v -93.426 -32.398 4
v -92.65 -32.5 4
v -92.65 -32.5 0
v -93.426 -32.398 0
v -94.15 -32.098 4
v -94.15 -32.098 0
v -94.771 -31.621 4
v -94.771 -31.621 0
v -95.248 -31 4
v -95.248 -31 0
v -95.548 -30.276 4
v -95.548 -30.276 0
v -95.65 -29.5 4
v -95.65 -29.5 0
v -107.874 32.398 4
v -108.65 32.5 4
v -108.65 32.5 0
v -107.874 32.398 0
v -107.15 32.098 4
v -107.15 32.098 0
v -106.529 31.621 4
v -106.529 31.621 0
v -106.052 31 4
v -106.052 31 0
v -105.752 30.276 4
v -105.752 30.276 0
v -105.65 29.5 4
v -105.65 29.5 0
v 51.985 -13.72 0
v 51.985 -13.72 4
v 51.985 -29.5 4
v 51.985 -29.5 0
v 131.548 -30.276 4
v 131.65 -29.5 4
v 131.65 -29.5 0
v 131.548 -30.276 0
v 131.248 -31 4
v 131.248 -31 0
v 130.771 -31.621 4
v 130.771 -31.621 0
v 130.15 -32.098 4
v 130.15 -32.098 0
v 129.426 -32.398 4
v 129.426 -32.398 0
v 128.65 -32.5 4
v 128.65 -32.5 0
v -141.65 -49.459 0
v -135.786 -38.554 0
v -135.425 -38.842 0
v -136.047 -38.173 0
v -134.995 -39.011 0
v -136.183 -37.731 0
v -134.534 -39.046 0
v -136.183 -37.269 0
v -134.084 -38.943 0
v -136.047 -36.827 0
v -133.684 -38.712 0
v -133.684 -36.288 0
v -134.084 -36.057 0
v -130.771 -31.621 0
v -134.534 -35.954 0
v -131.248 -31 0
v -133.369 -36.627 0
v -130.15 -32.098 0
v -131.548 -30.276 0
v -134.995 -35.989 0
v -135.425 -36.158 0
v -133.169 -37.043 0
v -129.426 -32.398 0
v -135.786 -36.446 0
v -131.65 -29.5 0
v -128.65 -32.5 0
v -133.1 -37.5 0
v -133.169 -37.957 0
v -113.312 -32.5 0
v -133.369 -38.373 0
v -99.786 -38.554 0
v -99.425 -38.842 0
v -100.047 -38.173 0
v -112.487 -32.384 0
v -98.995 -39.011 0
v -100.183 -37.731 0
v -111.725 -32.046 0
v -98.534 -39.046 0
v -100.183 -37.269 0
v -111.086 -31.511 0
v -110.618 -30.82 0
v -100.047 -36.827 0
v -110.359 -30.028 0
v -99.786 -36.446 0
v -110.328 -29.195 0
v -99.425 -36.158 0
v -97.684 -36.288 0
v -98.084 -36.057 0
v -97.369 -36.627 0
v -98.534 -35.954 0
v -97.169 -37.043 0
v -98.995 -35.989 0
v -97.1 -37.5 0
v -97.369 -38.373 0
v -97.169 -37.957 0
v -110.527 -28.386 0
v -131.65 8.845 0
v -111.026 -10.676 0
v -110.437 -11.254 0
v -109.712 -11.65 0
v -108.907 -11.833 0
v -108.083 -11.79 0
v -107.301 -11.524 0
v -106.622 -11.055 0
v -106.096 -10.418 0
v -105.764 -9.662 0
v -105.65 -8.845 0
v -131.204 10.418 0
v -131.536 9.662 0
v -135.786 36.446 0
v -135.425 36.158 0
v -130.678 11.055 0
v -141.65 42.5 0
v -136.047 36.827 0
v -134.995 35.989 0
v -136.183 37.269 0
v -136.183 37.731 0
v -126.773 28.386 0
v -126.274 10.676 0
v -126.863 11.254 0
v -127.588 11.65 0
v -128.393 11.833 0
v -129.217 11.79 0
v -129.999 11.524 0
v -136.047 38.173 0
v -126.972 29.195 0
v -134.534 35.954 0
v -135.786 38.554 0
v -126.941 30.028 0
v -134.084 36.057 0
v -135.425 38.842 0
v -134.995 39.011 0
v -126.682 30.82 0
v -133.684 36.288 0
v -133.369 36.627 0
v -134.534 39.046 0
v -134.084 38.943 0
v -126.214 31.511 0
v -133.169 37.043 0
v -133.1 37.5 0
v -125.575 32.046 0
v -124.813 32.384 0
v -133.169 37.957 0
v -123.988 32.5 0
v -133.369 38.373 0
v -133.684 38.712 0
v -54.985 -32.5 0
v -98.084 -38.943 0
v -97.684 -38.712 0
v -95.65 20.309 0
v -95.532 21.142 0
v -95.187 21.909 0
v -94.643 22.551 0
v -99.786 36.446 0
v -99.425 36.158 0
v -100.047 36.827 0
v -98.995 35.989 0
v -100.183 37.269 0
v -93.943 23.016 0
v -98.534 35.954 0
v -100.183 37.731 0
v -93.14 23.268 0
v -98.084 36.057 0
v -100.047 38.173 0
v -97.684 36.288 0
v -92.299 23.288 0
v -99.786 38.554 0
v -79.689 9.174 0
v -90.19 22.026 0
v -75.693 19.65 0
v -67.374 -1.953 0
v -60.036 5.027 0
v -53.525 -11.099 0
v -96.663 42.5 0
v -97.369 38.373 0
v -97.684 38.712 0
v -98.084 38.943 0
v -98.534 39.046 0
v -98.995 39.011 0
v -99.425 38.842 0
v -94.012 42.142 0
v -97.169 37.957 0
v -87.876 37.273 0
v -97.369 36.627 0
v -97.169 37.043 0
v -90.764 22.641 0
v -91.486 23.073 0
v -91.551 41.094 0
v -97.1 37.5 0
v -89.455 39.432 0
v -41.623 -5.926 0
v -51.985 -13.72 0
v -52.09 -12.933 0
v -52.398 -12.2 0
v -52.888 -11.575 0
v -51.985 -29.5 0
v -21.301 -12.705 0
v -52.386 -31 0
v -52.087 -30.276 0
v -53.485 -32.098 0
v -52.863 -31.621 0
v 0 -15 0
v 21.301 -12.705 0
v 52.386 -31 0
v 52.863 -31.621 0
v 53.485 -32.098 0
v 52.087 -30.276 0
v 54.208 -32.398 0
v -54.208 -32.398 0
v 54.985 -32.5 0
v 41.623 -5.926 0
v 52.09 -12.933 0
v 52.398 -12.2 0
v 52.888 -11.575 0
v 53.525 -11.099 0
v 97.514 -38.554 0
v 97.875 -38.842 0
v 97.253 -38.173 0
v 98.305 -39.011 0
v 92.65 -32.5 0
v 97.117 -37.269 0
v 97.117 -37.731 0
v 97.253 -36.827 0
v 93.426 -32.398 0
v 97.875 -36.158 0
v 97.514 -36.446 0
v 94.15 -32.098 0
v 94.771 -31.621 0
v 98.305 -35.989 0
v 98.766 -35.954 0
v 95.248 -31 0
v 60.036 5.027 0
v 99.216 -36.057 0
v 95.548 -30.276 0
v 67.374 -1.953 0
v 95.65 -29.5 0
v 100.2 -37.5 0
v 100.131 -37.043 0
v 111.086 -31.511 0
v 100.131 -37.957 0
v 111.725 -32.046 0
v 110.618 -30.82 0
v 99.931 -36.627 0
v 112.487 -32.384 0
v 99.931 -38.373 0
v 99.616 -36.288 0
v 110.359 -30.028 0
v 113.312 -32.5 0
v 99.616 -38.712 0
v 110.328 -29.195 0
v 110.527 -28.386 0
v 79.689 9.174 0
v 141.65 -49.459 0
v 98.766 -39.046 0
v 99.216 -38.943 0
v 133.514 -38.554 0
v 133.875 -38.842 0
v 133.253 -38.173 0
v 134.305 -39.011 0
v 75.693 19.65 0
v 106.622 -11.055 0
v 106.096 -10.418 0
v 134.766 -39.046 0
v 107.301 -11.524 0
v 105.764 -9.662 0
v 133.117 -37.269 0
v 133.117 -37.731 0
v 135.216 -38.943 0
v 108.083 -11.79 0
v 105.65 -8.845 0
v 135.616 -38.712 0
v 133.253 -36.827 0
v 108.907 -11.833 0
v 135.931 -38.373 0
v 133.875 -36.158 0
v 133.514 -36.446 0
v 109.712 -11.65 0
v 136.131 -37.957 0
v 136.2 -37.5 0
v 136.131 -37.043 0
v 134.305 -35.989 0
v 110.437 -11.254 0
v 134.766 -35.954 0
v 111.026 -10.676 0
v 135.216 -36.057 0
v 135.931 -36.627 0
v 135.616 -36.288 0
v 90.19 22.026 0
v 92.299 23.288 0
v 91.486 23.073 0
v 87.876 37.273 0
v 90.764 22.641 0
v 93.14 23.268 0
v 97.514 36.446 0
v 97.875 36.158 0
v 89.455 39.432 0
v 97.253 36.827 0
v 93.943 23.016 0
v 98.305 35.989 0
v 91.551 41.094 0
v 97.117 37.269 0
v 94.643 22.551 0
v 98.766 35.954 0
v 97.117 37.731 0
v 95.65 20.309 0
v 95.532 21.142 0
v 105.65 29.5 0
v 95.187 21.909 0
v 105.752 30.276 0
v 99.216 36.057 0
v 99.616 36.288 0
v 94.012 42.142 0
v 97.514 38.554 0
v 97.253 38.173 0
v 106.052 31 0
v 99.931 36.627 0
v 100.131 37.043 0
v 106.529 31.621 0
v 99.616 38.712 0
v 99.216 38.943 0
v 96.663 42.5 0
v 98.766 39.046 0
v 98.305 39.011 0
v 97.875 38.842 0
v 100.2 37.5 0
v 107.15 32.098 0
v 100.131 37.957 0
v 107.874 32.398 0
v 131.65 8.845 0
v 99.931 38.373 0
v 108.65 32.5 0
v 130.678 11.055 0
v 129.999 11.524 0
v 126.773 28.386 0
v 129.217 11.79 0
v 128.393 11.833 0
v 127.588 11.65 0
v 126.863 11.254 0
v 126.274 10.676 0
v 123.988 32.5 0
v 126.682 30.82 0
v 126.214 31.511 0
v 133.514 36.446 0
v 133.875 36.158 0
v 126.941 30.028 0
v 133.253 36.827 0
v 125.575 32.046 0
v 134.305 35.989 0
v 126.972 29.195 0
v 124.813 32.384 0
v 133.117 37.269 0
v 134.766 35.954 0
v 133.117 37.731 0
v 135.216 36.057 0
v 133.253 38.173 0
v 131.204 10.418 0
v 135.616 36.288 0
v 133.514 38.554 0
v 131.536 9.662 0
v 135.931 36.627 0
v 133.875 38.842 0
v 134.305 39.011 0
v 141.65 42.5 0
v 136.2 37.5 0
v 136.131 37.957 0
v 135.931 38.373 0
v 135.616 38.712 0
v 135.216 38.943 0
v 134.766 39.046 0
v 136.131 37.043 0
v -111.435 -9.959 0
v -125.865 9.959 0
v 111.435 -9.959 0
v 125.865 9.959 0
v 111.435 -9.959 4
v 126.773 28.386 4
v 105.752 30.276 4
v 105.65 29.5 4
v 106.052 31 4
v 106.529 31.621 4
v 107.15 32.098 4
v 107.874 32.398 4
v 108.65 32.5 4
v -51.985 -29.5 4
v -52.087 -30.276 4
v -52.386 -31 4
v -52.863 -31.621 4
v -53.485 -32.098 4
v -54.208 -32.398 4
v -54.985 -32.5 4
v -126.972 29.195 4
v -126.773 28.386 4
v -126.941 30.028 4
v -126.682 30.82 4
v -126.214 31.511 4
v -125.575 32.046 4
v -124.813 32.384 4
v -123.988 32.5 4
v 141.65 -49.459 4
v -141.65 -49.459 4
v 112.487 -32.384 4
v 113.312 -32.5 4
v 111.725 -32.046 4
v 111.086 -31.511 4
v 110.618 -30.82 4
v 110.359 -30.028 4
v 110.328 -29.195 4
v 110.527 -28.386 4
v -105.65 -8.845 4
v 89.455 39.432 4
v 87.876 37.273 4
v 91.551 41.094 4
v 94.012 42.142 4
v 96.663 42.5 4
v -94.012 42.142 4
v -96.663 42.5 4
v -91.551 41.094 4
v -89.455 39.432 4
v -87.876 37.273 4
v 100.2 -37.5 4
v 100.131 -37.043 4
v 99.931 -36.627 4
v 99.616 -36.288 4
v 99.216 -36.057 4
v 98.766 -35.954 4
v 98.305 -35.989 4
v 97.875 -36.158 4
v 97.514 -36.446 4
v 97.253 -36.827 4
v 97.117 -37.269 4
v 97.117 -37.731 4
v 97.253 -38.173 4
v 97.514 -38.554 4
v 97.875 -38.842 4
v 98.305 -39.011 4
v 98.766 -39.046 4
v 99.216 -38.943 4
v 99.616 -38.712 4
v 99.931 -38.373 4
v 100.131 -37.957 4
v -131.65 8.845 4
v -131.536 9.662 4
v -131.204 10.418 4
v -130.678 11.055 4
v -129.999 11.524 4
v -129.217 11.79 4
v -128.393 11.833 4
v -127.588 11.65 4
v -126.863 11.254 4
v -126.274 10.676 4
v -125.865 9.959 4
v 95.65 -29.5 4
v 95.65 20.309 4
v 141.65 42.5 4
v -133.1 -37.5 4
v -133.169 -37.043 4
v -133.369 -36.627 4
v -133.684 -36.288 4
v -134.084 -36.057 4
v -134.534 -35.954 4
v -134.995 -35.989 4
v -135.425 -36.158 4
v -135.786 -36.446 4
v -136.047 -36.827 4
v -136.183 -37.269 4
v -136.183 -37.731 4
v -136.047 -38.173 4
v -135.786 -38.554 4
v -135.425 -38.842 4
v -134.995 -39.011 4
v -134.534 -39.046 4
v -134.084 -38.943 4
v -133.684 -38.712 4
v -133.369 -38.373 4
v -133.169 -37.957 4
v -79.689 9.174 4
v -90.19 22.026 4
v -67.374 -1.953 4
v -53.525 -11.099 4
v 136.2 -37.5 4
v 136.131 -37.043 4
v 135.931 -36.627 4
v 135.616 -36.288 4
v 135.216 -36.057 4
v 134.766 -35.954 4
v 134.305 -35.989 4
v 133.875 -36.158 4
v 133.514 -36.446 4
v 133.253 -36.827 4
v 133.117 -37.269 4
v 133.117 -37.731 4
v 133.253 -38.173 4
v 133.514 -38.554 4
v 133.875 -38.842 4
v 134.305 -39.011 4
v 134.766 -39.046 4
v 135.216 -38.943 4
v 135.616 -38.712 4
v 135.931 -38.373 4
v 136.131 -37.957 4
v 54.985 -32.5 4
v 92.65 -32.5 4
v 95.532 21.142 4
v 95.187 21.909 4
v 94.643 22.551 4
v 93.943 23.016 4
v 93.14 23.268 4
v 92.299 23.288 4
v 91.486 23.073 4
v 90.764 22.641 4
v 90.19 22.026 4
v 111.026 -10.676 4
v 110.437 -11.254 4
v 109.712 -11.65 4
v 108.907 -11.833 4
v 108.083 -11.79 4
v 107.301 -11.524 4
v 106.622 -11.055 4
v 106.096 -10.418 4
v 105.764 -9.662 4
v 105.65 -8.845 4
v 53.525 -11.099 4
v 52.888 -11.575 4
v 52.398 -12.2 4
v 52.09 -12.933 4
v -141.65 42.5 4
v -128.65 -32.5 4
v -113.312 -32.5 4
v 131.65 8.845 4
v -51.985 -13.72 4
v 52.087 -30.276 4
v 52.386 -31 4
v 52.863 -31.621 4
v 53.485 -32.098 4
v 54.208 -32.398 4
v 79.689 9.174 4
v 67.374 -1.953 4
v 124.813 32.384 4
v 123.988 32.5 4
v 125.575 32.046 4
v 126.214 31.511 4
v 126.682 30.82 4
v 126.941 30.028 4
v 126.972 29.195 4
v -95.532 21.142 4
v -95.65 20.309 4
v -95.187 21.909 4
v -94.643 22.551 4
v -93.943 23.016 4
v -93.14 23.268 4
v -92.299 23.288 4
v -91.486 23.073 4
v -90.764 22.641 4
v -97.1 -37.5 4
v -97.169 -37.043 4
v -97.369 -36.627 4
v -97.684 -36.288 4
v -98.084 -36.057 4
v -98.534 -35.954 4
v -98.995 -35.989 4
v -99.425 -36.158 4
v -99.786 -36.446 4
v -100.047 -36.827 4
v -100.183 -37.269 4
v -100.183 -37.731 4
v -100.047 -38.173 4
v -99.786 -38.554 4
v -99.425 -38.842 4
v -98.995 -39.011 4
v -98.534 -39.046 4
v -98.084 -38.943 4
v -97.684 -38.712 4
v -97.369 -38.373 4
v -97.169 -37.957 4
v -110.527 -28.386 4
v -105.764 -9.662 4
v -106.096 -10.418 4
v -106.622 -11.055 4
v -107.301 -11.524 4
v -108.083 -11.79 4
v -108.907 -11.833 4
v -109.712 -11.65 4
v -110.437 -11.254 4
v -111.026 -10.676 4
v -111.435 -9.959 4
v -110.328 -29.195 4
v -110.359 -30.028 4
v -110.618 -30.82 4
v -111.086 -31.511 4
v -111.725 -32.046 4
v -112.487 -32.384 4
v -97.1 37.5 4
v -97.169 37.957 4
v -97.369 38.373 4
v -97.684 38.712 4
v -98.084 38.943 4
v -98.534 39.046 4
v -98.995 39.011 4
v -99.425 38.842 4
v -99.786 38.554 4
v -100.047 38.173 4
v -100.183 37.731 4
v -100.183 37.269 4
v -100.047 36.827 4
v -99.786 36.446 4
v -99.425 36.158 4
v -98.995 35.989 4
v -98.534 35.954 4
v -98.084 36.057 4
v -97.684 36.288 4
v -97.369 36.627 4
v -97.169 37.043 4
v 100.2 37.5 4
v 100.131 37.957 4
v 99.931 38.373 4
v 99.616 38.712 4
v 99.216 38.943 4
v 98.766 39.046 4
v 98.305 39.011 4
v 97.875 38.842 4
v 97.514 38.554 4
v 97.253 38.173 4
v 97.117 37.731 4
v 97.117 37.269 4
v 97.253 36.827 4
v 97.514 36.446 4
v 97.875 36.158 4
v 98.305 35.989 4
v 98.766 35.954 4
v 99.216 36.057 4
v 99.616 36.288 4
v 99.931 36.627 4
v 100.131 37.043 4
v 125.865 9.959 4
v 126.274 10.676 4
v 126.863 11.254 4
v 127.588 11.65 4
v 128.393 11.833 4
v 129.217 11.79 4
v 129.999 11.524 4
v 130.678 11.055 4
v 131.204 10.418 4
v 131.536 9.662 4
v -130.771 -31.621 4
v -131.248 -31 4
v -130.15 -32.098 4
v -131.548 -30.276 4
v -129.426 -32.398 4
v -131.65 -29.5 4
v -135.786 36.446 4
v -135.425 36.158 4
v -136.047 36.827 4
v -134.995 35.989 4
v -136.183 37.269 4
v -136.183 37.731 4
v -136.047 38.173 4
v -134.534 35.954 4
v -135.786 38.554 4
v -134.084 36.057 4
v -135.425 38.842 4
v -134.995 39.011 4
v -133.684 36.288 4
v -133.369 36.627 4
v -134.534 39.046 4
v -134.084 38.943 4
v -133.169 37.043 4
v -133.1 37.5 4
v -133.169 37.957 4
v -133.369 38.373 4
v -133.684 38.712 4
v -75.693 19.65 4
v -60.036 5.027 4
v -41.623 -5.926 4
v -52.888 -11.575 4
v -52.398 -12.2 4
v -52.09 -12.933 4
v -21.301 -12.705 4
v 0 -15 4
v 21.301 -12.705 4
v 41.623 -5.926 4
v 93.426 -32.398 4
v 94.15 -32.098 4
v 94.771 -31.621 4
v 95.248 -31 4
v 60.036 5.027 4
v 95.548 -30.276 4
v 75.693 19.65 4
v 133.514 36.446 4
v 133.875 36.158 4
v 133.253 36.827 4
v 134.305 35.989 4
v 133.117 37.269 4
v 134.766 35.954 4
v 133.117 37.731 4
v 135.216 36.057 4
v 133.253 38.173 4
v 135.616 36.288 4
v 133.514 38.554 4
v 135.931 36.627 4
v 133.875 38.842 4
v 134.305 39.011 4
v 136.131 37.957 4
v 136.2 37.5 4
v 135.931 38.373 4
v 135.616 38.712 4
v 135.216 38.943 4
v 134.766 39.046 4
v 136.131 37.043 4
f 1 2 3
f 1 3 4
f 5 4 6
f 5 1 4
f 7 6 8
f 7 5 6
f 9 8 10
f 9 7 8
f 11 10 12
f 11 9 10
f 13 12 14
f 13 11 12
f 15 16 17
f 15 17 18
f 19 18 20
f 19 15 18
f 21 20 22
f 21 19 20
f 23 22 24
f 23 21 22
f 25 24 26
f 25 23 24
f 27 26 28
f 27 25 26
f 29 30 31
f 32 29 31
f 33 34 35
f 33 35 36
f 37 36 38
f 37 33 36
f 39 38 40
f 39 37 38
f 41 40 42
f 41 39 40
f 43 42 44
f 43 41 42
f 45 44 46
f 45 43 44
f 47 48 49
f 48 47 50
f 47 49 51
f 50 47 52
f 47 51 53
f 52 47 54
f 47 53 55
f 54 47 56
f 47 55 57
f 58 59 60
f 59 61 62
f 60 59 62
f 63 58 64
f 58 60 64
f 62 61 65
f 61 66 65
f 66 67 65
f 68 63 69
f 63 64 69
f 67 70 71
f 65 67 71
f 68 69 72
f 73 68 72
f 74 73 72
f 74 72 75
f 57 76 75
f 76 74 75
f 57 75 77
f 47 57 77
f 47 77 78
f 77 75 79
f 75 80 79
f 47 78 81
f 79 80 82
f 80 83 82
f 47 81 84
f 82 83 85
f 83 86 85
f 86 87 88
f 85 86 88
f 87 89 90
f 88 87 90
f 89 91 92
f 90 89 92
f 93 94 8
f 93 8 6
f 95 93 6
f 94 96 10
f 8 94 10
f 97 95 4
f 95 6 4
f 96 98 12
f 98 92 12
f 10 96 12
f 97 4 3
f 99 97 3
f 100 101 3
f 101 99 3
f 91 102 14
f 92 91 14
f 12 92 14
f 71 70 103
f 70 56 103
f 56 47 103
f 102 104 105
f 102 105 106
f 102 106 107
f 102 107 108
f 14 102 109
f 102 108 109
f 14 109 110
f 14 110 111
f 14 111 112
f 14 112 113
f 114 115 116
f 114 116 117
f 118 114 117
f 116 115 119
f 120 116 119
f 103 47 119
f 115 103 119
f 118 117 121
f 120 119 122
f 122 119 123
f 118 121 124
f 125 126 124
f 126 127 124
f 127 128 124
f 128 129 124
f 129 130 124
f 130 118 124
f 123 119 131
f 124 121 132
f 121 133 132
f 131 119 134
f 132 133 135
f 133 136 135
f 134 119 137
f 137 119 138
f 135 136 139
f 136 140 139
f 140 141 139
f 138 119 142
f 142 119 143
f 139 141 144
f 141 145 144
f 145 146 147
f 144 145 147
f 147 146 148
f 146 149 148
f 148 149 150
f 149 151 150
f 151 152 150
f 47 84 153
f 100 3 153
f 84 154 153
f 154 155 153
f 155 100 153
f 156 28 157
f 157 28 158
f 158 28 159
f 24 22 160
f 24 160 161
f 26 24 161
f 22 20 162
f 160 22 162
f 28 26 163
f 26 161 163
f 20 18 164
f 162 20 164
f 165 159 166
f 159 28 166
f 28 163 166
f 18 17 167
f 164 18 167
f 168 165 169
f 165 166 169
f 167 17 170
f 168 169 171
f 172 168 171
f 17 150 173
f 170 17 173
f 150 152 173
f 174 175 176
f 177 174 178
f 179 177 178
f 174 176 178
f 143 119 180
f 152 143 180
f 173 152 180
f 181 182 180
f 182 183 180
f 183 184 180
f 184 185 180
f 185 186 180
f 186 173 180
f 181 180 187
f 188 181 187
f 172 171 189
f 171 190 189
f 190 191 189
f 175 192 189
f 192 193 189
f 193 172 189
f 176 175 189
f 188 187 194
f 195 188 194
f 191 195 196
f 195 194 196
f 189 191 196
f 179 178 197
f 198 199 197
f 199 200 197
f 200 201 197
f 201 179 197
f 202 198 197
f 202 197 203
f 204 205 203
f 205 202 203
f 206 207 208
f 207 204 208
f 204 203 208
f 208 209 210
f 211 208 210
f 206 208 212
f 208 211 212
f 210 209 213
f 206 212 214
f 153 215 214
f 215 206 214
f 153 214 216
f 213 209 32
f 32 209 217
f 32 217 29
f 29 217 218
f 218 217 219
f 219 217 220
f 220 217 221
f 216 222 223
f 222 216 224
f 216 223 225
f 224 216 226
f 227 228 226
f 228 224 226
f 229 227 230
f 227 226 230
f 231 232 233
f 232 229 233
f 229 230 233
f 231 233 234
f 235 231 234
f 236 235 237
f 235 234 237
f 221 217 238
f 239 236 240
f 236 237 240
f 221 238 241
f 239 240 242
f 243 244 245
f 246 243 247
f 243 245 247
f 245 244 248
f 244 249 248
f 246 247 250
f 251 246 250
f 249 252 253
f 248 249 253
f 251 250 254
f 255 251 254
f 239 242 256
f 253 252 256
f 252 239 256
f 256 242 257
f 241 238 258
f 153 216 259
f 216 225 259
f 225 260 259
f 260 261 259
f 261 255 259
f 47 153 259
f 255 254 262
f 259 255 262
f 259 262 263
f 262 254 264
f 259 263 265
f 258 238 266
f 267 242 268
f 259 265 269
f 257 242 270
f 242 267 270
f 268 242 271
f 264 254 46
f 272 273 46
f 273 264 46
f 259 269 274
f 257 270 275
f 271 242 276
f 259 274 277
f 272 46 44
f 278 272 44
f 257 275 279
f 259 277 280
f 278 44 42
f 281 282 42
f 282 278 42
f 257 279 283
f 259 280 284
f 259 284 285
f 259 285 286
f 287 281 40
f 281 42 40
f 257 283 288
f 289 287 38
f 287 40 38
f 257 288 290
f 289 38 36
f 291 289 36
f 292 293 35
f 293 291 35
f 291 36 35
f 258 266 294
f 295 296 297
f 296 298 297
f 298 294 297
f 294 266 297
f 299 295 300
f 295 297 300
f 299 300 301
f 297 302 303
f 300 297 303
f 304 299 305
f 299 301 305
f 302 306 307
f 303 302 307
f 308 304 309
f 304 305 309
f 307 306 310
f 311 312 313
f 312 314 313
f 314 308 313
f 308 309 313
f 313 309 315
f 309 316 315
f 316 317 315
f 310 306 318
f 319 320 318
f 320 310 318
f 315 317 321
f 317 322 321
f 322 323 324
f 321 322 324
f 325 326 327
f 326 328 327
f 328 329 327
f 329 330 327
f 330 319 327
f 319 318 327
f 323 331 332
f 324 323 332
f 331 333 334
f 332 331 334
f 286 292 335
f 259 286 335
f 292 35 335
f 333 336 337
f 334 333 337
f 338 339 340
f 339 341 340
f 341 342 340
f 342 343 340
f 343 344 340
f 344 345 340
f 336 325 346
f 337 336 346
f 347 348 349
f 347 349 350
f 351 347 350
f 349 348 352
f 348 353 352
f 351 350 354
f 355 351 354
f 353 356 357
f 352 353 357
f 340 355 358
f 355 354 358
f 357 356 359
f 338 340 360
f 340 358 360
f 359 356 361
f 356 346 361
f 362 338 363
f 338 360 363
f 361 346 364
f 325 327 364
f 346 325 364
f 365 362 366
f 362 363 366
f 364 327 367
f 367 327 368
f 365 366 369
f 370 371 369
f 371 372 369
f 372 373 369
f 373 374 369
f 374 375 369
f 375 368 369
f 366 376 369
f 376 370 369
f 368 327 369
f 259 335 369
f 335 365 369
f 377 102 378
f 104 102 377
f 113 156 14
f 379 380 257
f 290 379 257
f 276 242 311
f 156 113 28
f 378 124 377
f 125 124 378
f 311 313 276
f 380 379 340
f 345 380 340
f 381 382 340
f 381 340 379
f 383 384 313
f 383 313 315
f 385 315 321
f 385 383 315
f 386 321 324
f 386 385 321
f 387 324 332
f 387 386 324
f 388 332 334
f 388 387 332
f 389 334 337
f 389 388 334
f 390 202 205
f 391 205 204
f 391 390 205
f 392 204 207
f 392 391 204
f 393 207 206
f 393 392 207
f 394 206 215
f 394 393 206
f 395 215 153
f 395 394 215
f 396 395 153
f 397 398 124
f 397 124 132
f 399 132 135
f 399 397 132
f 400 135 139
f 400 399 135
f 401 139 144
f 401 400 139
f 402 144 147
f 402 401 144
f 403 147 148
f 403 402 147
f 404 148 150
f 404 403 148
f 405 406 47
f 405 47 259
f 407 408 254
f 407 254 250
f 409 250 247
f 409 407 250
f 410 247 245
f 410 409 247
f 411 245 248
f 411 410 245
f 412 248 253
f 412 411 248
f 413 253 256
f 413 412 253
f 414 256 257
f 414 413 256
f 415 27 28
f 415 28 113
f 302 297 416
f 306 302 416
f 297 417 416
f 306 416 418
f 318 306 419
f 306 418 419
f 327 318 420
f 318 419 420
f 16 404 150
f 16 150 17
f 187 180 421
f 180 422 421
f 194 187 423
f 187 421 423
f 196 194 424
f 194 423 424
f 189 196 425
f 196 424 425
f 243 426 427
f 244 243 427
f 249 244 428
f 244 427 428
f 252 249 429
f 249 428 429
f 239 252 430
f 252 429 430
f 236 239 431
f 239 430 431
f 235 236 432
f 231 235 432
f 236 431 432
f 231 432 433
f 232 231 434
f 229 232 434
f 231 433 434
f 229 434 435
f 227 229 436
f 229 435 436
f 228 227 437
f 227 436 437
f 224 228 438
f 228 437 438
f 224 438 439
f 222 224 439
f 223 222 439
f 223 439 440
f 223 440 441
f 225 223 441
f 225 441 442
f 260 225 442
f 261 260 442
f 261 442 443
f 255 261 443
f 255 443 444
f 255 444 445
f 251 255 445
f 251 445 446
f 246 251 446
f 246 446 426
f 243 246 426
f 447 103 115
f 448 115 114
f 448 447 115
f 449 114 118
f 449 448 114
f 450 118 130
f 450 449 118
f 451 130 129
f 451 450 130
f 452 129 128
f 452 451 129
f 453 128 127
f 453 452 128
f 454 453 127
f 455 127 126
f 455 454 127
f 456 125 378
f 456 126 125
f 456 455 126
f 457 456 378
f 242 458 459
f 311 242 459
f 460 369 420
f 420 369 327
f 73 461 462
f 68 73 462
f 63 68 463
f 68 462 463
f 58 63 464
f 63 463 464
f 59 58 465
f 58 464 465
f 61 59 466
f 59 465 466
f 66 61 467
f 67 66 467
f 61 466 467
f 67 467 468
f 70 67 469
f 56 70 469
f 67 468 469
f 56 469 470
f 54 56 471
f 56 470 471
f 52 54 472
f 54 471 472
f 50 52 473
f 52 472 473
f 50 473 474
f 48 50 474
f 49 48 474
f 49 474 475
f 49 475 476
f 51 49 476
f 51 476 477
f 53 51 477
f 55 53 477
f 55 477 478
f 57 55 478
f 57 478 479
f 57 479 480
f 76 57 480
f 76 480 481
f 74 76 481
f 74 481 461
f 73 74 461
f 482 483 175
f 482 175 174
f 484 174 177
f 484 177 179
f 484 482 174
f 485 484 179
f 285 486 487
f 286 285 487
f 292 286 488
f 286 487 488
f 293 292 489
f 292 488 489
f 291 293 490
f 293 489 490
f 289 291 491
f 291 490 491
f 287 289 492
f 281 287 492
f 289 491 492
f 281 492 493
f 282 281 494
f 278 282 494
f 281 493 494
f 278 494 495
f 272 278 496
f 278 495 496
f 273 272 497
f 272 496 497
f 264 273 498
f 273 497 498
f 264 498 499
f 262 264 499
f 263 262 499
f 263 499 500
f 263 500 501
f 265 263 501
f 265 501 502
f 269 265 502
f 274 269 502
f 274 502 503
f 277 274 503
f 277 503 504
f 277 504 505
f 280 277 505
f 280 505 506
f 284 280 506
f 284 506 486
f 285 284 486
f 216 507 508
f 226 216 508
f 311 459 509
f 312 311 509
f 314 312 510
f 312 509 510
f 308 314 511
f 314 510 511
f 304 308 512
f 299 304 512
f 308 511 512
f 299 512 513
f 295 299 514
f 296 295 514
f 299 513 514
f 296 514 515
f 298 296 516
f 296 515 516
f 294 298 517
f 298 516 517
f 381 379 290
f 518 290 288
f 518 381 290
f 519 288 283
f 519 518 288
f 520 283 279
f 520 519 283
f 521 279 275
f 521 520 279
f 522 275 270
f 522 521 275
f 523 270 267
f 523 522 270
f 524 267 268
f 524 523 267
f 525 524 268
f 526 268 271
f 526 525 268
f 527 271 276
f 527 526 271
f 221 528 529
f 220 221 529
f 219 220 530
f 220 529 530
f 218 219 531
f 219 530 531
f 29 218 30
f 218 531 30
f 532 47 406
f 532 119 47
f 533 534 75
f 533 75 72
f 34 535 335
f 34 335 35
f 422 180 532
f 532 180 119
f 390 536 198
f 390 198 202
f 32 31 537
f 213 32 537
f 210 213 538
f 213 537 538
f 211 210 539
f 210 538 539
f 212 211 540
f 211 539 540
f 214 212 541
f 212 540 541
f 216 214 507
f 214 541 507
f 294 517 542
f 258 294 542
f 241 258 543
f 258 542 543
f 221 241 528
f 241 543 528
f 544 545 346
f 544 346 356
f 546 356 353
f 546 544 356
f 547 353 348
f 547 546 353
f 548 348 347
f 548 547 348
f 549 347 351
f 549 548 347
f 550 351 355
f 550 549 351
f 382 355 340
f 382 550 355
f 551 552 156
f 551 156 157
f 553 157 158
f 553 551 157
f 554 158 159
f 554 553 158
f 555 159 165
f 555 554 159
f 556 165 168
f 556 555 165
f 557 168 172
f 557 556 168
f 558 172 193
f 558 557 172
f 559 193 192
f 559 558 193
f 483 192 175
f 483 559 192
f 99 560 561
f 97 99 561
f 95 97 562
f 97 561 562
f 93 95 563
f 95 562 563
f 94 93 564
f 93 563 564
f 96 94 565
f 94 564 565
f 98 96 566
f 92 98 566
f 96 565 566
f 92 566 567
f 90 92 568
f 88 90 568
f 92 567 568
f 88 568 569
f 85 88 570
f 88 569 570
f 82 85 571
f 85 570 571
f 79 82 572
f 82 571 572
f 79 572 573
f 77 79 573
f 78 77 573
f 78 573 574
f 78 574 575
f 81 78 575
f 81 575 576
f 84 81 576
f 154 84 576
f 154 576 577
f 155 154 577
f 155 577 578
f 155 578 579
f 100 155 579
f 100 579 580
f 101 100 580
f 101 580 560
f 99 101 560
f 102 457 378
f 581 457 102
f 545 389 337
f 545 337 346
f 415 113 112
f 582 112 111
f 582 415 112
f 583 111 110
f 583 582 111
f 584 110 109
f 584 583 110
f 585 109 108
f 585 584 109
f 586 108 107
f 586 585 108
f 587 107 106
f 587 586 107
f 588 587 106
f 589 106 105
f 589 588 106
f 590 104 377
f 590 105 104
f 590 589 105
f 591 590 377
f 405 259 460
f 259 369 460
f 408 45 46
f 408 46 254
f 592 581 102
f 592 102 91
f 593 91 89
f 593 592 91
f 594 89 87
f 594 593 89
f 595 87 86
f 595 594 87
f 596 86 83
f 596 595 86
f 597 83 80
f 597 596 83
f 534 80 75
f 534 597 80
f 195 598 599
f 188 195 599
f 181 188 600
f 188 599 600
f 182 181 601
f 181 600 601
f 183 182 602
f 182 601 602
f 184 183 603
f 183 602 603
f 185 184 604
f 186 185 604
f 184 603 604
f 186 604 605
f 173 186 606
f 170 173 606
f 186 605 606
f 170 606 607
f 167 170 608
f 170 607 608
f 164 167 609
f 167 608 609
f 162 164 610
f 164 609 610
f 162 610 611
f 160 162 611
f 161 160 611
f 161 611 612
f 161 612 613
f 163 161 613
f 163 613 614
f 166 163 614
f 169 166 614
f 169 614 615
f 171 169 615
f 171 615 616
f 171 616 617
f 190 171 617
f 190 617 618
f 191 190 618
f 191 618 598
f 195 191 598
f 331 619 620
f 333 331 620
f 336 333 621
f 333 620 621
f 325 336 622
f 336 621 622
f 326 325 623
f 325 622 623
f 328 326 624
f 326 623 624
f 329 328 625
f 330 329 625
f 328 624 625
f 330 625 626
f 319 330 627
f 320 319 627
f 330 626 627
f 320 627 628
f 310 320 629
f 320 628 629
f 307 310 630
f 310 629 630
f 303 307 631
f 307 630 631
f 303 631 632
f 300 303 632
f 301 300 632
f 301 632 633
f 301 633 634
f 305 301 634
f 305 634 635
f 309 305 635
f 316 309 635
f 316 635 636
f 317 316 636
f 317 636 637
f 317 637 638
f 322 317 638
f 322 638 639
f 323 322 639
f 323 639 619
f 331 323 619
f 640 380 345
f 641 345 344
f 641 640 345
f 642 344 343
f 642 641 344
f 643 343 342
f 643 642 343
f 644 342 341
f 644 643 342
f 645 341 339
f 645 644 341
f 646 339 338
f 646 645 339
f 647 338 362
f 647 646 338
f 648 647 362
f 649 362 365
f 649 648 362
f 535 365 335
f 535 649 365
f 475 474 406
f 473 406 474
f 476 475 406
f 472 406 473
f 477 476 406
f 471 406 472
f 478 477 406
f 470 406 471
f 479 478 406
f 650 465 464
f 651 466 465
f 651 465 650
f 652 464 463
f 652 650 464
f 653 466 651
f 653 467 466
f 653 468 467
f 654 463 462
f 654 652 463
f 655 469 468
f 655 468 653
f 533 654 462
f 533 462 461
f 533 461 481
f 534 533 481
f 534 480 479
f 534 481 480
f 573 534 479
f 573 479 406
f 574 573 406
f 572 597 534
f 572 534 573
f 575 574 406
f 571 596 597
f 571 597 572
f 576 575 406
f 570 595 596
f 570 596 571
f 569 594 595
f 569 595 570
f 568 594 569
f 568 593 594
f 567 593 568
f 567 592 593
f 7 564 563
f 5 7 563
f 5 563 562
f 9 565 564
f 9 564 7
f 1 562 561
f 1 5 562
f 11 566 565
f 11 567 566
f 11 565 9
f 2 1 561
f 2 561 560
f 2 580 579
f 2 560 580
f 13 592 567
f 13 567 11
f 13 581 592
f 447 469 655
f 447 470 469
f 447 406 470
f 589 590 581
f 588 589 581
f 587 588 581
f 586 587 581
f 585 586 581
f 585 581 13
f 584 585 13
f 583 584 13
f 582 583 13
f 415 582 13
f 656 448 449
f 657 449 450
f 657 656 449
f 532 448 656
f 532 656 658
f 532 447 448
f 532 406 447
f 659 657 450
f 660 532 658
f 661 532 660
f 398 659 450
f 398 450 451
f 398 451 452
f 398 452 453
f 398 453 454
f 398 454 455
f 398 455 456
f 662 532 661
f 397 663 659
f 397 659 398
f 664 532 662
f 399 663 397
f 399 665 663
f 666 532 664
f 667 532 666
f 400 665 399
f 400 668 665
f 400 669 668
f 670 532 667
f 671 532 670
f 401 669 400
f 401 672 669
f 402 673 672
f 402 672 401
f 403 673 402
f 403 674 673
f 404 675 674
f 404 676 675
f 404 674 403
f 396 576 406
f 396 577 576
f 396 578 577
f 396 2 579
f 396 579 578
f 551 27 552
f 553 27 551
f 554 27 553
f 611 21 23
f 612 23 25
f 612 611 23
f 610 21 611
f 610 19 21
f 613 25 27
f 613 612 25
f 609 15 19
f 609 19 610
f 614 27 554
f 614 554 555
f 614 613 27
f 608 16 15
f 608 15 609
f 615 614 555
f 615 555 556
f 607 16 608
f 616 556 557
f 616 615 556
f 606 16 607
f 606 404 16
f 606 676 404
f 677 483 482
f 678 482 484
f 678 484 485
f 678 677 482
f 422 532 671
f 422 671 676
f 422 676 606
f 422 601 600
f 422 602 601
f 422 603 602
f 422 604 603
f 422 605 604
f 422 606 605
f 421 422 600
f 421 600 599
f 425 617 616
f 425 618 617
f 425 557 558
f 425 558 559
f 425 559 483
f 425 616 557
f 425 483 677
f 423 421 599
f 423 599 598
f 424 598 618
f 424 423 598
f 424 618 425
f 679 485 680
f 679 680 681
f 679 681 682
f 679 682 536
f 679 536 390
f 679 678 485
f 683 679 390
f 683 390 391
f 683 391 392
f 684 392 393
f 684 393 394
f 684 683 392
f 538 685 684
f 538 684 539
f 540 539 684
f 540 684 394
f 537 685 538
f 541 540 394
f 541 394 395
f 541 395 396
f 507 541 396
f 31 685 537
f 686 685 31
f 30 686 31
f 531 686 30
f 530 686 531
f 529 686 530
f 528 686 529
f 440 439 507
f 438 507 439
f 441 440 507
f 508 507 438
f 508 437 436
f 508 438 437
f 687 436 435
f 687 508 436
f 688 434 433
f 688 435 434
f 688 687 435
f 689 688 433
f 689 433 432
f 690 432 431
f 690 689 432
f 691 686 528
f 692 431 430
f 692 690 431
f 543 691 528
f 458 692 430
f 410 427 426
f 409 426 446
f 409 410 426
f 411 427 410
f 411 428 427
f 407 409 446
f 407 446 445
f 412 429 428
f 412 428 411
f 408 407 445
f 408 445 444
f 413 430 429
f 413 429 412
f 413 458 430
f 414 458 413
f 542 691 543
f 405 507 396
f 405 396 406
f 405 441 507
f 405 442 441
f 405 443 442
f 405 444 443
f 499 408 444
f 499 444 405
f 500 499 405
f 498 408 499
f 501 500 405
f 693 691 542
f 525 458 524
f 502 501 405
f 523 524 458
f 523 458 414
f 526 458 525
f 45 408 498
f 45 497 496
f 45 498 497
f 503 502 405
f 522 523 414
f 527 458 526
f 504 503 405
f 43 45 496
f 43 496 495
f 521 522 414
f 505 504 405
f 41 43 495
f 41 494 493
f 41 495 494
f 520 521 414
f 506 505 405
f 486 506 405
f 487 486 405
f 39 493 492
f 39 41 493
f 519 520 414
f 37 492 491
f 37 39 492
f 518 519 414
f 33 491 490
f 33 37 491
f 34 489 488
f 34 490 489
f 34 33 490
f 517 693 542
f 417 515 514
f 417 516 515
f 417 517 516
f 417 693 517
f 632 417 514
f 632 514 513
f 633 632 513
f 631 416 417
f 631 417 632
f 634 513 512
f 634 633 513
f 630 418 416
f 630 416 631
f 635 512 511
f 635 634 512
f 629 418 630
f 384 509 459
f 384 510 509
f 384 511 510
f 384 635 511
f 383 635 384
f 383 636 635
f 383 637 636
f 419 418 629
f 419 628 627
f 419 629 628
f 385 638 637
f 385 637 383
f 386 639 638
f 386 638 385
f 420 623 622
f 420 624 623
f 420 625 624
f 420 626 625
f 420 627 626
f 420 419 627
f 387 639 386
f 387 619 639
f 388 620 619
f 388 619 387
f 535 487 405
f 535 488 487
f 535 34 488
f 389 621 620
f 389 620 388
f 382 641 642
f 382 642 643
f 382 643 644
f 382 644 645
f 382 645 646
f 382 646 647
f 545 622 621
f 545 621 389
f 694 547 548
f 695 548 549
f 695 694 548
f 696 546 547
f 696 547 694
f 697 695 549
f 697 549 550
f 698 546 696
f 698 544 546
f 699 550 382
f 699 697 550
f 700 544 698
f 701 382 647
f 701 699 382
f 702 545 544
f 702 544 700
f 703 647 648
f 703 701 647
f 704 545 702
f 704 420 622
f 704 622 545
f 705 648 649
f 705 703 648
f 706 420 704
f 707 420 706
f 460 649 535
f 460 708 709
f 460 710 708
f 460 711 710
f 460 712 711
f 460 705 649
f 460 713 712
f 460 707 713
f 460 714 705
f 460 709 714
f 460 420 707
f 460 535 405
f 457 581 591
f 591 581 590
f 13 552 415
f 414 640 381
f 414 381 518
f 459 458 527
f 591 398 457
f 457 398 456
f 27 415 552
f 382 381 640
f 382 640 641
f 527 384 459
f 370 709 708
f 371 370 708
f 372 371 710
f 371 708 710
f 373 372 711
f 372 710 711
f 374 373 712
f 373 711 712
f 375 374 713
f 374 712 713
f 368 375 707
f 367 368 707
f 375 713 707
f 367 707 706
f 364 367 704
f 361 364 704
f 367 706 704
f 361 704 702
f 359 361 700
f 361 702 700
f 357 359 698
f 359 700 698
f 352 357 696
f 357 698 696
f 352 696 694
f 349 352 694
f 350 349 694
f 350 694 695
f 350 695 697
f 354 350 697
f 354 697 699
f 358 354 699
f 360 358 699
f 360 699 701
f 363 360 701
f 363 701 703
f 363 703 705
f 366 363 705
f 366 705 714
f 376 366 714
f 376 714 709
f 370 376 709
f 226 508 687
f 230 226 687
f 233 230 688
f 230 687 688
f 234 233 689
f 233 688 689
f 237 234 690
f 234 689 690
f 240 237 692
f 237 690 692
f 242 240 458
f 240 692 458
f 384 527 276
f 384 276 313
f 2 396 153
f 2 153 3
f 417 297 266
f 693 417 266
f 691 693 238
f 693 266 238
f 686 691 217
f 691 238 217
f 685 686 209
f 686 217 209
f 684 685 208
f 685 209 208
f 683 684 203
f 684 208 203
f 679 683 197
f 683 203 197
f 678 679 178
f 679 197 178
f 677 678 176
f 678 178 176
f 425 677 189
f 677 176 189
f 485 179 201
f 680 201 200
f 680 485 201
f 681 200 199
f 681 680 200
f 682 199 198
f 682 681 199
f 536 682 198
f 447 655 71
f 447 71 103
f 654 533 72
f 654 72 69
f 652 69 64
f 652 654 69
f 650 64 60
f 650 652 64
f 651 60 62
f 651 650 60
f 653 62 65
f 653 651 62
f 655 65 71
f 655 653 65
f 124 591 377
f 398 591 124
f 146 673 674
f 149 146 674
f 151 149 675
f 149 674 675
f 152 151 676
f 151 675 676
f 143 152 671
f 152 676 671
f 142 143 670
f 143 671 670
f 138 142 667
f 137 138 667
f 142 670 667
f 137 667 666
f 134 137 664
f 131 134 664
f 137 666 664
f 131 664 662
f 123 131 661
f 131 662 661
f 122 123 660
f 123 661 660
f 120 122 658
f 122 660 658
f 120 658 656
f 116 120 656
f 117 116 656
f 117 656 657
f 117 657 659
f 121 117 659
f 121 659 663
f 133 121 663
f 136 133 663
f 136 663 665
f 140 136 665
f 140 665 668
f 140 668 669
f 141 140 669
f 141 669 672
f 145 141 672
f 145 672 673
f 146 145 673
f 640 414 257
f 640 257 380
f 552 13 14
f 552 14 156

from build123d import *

# Parameters (mm, degrees)
BOSS_EXTRUDE1_DEPTH = 4
SKETCH2_R           = 1.55
CUT_EXTRUDE1_DEPTH  = 10
FILLET1_R           = 10
SKETCH3_W           = 283.3
SKETCH3_H           = 4
BOSS_EXTRUDE2_DEPTH = 6.958779143


with BuildPart() as part:
    # Sketch1 → Boss-Extrude1 (new body)
    with BuildSketch(Plane.XY):
        with BuildLine():
            Line((-141.65, 42.5), (-141.65, -42.5))
            Line((-141.65, -42.5), (141.65, -42.5))
            Line((141.65, -42.5), (141.65, 42.5))
            Line((141.65, 42.5), (90.519334951, 42.5))
            ThreePointArc((90.519334951, 42.5), (0, -15), (-90.519334951, 42.5))
            Line((-90.519334951, 42.5), (-141.65, 42.5))
        make_face()
    extrude(amount=BOSS_EXTRUDE1_DEPTH)

    # Sketch2 → Cut-Extrude1 (cut)
    with BuildSketch(Plane.XY.offset(4)):
        with BuildLine():
            Line((-125.864569927, 9.958677608), (-110.526767696, -28.385827971))
            ThreePointArc((-110.526767696, -28.385827971), (-110.827996077, -31.181886428), (-113.312197769, -32.5))
            Line((-113.312197769, -32.5), (-128.65, -32.5))
            ThreePointArc((-128.65, -32.5), (-130.771320344, -31.621320344), (-131.65, -29.5))
            Line((-131.65, -29.5), (-131.65, 8.844505579))
            ThreePointArc((-131.65, 8.844505579), (-129.217322563, 11.790374739), (-125.864569927, 9.958677608))
        make_face()
        with BuildLine():
            ThreePointArc((-126.773232304, 28.385827971), (-126.472003923, 31.181886428), (-123.987802231, 32.5))
            Line((-123.987802231, 32.5), (-108.65, 32.5))
            ThreePointArc((-108.65, 32.5), (-106.528679656, 31.621320344), (-105.65, 29.5))
            Line((-105.65, 29.5), (-105.65, -8.844505579))
            ThreePointArc((-105.65, -8.844505579), (-108.082677437, -11.790374739), (-111.435430073, -9.958677608))
            Line((-111.435430073, -9.958677608), (-126.773232304, 28.385827971))
        make_face()
        with BuildLine():
            ThreePointArc((-95.65, 20.308597944), (-93.550221212, 23.170345971), (-90.190265487, 22.026068795))
            ThreePointArc((-90.190265487, 22.026068795), (-73.741634921, 3.377875064), (-53.524791107, -11.0994107))
            ThreePointArc((-53.524791107, -11.0994107), (-52.39812226, -12.200320346), (-51.984558137, -13.72030372))
            Line((-51.984558137, -13.72030372), (-51.984558137, -29.5))
            ThreePointArc((-51.984558137, -29.5), (-52.863237794, -31.621320344), (-54.984558137, -32.5))
            Line((-54.984558137, -32.5), (-92.65, -32.5))
            ThreePointArc((-92.65, -32.5), (-94.771320344, -31.621320344), (-95.65, -29.5))
            Line((-95.65, -29.5), (-95.65, 20.308597944))
        make_face()
        with BuildLine():
            ThreePointArc((95.65, 20.308597944), (93.550221212, 23.170345971), (90.190265487, 22.026068795))
            ThreePointArc((90.190265487, 22.026068795), (73.741634921, 3.377875064), (53.524791107, -11.0994107))
            ThreePointArc((53.524791107, -11.0994107), (52.39812226, -12.200320346), (51.984558137, -13.72030372))
            Line((51.984558137, -13.72030372), (51.984558137, -29.5))
            ThreePointArc((51.984558137, -29.5), (52.863237794, -31.621320344), (54.984558137, -32.5))
            Line((54.984558137, -32.5), (92.65, -32.5))
            ThreePointArc((92.65, -32.5), (94.771320344, -31.621320344), (95.65, -29.5))
            Line((95.65, -29.5), (95.65, 20.308597944))
        make_face()
        with BuildLine():
            ThreePointArc((111.435430073, -9.958677608), (108.082677437, -11.790374739), (105.65, -8.844505579))
            Line((105.65, -8.844505579), (105.65, 29.5))
            ThreePointArc((105.65, 29.5), (106.528679656, 31.621320344), (108.65, 32.5))
            Line((108.65, 32.5), (123.987802231, 32.5))
            ThreePointArc((123.987802231, 32.5), (126.472003923, 31.181886428), (126.773232304, 28.385827971))
            Line((126.773232304, 28.385827971), (111.435430073, -9.958677608))
        make_face()
        with BuildLine():
            Line((128.65, -32.5), (113.312197769, -32.5))
            ThreePointArc((113.312197769, -32.5), (110.827996077, -31.181886428), (110.526767696, -28.385827971))
            Line((110.526767696, -28.385827971), (125.864569927, 9.958677608))
            ThreePointArc((125.864569927, 9.958677608), (129.217322563, 11.790374739), (131.65, 8.844505579))
            Line((131.65, 8.844505579), (131.65, -29.5))
            ThreePointArc((131.65, -29.5), (130.771320344, -31.621320344), (128.65, -32.5))
        make_face()
        with Locations((-134.65, 37.5)):
            Circle(SKETCH2_R)
        with Locations((-98.65, 37.5)):
            Circle(SKETCH2_R)
        with Locations((-98.65, -37.5)):
            Circle(SKETCH2_R)
        with Locations((-134.65, -37.5)):
            Circle(SKETCH2_R)
        with Locations((98.65, -37.5)):
            Circle(SKETCH2_R)
        with Locations((134.65, -37.5)):
            Circle(SKETCH2_R)
        with Locations((98.65, 37.5)):
            Circle(SKETCH2_R)
        with Locations((134.65, 37.5)):
            Circle(SKETCH2_R)
    extrude(amount=-CUT_EXTRUDE1_DEPTH, mode=Mode.SUBTRACT)

    # Fillet1
    fillet1_edges = [part.edges().sort_by_distance(p)[0] for p in [
        (90.519334951, 42.5, 2),
        (-90.519334951, 42.5, 2),
    ]]
    fillet(fillet1_edges, radius=FILLET1_R)

    # Sketch3 → Boss-Extrude2 (add)
    with BuildSketch(Plane.XZ.offset(42.5)):
        with Locations((0, 2)):
            Rectangle(SKETCH3_W, SKETCH3_H)
    extrude(amount=BOSS_EXTRUDE2_DEPTH)


solid = part.part
